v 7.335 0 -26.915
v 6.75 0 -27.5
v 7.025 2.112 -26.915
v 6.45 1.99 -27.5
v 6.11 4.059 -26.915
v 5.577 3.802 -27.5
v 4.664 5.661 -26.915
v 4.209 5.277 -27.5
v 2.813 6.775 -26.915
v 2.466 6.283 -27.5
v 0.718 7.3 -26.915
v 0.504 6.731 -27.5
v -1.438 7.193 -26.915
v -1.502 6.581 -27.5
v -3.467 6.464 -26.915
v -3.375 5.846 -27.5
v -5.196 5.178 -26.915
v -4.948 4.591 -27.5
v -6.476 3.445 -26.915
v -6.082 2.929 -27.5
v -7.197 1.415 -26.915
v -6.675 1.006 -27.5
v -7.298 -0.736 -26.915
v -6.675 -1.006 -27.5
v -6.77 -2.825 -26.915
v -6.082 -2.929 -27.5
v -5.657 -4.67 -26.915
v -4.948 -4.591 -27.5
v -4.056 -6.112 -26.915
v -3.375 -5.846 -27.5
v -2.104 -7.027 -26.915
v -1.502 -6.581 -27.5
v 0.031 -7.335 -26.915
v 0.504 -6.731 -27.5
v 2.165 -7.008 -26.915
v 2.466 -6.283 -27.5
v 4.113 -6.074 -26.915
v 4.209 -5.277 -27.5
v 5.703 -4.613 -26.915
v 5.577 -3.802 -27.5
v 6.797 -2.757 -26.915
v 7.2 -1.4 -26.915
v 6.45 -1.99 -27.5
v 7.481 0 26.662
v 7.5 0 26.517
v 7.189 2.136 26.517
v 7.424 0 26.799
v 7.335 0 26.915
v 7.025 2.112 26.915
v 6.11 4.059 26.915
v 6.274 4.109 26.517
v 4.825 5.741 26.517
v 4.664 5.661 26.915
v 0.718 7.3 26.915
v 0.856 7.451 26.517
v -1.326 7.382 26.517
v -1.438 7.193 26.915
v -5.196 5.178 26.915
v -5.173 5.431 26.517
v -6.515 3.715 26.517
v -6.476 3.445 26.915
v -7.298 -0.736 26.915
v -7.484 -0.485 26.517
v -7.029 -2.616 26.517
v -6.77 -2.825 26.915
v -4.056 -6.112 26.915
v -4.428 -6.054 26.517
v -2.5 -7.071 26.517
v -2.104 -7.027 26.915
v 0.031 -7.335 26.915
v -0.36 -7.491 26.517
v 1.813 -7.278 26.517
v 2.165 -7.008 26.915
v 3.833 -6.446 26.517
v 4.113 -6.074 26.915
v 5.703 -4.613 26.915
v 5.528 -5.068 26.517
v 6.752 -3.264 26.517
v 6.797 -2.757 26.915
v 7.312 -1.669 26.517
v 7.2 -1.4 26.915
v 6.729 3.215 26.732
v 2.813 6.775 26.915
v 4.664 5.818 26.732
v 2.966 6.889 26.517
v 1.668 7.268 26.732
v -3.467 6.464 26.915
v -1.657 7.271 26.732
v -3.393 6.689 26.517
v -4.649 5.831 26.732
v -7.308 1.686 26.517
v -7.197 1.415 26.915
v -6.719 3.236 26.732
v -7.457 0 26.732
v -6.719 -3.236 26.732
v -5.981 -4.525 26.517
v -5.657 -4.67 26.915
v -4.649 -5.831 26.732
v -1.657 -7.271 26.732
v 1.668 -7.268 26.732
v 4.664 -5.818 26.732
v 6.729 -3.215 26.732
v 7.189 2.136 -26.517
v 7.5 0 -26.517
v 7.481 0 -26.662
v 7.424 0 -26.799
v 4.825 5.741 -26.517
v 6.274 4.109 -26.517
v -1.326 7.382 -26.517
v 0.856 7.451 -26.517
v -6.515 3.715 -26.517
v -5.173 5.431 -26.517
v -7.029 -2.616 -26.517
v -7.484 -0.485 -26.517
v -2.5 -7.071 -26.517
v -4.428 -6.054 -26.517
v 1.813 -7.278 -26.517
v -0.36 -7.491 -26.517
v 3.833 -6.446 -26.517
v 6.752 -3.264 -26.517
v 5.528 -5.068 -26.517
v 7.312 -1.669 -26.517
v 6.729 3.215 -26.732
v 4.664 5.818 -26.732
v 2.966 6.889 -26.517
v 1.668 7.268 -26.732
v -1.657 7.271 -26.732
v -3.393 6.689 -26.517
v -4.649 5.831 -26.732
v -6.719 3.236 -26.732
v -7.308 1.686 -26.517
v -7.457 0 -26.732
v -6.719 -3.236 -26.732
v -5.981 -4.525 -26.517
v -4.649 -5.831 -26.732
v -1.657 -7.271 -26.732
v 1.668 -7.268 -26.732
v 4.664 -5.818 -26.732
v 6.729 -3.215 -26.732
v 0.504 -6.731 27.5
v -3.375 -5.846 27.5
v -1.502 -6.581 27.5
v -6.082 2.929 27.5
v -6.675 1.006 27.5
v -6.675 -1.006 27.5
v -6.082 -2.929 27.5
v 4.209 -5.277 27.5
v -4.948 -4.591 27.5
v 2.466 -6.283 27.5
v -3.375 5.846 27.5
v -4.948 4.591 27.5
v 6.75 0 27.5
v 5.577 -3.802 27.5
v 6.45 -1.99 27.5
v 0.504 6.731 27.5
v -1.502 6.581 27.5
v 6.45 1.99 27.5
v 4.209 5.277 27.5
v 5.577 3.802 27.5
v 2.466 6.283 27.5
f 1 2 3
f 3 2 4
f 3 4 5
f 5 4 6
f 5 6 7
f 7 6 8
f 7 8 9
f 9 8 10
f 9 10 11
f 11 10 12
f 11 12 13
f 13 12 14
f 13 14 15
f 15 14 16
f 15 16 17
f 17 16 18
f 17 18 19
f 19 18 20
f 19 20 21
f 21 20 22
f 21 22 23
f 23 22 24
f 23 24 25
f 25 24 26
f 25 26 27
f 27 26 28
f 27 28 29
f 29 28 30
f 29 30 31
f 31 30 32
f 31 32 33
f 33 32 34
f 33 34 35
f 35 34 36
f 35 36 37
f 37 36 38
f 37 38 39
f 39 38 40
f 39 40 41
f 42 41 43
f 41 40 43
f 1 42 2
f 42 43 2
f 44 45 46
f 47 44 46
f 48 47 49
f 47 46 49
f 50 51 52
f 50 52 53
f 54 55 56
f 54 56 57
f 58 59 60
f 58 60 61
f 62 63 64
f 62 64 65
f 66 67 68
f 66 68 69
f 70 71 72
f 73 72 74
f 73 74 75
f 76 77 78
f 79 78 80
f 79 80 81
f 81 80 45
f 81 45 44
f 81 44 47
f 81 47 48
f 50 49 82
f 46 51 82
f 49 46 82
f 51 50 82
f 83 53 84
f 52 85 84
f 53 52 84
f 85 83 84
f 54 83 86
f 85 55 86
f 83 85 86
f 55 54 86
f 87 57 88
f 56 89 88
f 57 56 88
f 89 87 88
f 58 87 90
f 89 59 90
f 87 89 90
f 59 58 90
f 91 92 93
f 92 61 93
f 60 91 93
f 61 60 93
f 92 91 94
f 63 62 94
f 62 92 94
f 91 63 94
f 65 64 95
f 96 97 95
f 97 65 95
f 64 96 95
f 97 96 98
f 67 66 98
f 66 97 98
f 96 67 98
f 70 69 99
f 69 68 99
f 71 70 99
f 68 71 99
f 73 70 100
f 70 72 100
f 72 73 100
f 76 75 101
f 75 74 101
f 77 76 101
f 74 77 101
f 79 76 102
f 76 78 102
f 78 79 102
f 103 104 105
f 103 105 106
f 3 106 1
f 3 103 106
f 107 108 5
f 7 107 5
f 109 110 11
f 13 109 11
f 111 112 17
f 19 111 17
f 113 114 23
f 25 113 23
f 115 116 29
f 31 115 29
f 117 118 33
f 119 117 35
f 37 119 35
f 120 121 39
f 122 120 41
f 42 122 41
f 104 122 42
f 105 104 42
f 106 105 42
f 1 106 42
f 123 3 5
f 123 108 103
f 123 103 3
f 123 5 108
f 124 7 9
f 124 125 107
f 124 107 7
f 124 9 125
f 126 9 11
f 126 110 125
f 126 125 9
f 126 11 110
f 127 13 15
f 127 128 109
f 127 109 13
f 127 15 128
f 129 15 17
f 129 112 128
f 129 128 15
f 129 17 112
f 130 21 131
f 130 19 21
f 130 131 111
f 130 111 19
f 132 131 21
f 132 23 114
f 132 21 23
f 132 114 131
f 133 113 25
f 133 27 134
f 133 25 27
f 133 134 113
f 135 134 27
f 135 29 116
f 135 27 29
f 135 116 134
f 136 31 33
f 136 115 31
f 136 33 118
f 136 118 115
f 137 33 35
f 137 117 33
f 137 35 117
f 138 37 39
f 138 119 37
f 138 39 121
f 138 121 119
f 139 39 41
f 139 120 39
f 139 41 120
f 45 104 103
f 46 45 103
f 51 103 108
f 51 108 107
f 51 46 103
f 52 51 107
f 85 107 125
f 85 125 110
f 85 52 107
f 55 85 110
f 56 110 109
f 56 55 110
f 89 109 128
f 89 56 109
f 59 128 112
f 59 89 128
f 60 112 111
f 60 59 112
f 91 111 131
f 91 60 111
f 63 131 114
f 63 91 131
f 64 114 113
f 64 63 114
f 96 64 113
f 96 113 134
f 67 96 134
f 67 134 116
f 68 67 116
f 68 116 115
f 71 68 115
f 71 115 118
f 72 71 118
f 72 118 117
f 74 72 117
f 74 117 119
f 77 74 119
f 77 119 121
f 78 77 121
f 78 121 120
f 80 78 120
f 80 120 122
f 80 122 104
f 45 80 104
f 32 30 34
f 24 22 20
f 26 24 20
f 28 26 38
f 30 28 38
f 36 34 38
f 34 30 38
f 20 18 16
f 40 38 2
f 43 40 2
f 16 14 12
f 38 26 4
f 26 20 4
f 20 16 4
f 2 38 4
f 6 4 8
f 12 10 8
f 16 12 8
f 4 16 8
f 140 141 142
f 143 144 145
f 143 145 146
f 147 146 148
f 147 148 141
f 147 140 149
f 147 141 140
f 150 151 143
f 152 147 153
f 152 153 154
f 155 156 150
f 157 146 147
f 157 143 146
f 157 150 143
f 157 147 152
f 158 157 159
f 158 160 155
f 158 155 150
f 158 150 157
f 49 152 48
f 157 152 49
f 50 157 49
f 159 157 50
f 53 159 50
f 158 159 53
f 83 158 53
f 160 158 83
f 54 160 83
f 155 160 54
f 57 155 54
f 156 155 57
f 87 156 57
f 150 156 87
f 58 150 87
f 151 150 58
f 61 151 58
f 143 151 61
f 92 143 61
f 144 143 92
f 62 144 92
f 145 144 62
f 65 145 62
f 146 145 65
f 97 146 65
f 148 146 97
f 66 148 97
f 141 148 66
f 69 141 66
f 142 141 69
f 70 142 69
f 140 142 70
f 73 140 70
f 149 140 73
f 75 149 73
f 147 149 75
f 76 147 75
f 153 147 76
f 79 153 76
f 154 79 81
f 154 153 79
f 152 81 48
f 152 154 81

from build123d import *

# Parameters (mm, degrees)
SKETCH3_R           = 7.5
BOSS_EXTRUDE1_DEPTH = 27.5
CHAMFER1_SIZE       = 0.75
FILLET2_R           = 0.5625


with BuildPart() as part:
    # Sketch3 → Boss-Extrude1 (new, symmetric)
    with BuildSketch(Plane.XY):
        Circle(SKETCH3_R)
    extrude(amount=BOSS_EXTRUDE1_DEPTH, both=True)

    # Chamfer1
    chamfer1_edges = [part.edges().sort_by_distance(p)[0] for p in [
        (-7.5, 0, -27.5),
        (-7.5, 0, 27.5),
    ]]
    chamfer(chamfer1_edges, length=CHAMFER1_SIZE)

    # Fillet2
    fillet2_edges = [part.edges().sort_by_distance(p)[0] for p in [
        (-7.5, 0, -26.75),
        (-7.5, 0, 26.75),
    ]]
    fillet(fillet2_edges, radius=FILLET2_R)


solid = part.part
